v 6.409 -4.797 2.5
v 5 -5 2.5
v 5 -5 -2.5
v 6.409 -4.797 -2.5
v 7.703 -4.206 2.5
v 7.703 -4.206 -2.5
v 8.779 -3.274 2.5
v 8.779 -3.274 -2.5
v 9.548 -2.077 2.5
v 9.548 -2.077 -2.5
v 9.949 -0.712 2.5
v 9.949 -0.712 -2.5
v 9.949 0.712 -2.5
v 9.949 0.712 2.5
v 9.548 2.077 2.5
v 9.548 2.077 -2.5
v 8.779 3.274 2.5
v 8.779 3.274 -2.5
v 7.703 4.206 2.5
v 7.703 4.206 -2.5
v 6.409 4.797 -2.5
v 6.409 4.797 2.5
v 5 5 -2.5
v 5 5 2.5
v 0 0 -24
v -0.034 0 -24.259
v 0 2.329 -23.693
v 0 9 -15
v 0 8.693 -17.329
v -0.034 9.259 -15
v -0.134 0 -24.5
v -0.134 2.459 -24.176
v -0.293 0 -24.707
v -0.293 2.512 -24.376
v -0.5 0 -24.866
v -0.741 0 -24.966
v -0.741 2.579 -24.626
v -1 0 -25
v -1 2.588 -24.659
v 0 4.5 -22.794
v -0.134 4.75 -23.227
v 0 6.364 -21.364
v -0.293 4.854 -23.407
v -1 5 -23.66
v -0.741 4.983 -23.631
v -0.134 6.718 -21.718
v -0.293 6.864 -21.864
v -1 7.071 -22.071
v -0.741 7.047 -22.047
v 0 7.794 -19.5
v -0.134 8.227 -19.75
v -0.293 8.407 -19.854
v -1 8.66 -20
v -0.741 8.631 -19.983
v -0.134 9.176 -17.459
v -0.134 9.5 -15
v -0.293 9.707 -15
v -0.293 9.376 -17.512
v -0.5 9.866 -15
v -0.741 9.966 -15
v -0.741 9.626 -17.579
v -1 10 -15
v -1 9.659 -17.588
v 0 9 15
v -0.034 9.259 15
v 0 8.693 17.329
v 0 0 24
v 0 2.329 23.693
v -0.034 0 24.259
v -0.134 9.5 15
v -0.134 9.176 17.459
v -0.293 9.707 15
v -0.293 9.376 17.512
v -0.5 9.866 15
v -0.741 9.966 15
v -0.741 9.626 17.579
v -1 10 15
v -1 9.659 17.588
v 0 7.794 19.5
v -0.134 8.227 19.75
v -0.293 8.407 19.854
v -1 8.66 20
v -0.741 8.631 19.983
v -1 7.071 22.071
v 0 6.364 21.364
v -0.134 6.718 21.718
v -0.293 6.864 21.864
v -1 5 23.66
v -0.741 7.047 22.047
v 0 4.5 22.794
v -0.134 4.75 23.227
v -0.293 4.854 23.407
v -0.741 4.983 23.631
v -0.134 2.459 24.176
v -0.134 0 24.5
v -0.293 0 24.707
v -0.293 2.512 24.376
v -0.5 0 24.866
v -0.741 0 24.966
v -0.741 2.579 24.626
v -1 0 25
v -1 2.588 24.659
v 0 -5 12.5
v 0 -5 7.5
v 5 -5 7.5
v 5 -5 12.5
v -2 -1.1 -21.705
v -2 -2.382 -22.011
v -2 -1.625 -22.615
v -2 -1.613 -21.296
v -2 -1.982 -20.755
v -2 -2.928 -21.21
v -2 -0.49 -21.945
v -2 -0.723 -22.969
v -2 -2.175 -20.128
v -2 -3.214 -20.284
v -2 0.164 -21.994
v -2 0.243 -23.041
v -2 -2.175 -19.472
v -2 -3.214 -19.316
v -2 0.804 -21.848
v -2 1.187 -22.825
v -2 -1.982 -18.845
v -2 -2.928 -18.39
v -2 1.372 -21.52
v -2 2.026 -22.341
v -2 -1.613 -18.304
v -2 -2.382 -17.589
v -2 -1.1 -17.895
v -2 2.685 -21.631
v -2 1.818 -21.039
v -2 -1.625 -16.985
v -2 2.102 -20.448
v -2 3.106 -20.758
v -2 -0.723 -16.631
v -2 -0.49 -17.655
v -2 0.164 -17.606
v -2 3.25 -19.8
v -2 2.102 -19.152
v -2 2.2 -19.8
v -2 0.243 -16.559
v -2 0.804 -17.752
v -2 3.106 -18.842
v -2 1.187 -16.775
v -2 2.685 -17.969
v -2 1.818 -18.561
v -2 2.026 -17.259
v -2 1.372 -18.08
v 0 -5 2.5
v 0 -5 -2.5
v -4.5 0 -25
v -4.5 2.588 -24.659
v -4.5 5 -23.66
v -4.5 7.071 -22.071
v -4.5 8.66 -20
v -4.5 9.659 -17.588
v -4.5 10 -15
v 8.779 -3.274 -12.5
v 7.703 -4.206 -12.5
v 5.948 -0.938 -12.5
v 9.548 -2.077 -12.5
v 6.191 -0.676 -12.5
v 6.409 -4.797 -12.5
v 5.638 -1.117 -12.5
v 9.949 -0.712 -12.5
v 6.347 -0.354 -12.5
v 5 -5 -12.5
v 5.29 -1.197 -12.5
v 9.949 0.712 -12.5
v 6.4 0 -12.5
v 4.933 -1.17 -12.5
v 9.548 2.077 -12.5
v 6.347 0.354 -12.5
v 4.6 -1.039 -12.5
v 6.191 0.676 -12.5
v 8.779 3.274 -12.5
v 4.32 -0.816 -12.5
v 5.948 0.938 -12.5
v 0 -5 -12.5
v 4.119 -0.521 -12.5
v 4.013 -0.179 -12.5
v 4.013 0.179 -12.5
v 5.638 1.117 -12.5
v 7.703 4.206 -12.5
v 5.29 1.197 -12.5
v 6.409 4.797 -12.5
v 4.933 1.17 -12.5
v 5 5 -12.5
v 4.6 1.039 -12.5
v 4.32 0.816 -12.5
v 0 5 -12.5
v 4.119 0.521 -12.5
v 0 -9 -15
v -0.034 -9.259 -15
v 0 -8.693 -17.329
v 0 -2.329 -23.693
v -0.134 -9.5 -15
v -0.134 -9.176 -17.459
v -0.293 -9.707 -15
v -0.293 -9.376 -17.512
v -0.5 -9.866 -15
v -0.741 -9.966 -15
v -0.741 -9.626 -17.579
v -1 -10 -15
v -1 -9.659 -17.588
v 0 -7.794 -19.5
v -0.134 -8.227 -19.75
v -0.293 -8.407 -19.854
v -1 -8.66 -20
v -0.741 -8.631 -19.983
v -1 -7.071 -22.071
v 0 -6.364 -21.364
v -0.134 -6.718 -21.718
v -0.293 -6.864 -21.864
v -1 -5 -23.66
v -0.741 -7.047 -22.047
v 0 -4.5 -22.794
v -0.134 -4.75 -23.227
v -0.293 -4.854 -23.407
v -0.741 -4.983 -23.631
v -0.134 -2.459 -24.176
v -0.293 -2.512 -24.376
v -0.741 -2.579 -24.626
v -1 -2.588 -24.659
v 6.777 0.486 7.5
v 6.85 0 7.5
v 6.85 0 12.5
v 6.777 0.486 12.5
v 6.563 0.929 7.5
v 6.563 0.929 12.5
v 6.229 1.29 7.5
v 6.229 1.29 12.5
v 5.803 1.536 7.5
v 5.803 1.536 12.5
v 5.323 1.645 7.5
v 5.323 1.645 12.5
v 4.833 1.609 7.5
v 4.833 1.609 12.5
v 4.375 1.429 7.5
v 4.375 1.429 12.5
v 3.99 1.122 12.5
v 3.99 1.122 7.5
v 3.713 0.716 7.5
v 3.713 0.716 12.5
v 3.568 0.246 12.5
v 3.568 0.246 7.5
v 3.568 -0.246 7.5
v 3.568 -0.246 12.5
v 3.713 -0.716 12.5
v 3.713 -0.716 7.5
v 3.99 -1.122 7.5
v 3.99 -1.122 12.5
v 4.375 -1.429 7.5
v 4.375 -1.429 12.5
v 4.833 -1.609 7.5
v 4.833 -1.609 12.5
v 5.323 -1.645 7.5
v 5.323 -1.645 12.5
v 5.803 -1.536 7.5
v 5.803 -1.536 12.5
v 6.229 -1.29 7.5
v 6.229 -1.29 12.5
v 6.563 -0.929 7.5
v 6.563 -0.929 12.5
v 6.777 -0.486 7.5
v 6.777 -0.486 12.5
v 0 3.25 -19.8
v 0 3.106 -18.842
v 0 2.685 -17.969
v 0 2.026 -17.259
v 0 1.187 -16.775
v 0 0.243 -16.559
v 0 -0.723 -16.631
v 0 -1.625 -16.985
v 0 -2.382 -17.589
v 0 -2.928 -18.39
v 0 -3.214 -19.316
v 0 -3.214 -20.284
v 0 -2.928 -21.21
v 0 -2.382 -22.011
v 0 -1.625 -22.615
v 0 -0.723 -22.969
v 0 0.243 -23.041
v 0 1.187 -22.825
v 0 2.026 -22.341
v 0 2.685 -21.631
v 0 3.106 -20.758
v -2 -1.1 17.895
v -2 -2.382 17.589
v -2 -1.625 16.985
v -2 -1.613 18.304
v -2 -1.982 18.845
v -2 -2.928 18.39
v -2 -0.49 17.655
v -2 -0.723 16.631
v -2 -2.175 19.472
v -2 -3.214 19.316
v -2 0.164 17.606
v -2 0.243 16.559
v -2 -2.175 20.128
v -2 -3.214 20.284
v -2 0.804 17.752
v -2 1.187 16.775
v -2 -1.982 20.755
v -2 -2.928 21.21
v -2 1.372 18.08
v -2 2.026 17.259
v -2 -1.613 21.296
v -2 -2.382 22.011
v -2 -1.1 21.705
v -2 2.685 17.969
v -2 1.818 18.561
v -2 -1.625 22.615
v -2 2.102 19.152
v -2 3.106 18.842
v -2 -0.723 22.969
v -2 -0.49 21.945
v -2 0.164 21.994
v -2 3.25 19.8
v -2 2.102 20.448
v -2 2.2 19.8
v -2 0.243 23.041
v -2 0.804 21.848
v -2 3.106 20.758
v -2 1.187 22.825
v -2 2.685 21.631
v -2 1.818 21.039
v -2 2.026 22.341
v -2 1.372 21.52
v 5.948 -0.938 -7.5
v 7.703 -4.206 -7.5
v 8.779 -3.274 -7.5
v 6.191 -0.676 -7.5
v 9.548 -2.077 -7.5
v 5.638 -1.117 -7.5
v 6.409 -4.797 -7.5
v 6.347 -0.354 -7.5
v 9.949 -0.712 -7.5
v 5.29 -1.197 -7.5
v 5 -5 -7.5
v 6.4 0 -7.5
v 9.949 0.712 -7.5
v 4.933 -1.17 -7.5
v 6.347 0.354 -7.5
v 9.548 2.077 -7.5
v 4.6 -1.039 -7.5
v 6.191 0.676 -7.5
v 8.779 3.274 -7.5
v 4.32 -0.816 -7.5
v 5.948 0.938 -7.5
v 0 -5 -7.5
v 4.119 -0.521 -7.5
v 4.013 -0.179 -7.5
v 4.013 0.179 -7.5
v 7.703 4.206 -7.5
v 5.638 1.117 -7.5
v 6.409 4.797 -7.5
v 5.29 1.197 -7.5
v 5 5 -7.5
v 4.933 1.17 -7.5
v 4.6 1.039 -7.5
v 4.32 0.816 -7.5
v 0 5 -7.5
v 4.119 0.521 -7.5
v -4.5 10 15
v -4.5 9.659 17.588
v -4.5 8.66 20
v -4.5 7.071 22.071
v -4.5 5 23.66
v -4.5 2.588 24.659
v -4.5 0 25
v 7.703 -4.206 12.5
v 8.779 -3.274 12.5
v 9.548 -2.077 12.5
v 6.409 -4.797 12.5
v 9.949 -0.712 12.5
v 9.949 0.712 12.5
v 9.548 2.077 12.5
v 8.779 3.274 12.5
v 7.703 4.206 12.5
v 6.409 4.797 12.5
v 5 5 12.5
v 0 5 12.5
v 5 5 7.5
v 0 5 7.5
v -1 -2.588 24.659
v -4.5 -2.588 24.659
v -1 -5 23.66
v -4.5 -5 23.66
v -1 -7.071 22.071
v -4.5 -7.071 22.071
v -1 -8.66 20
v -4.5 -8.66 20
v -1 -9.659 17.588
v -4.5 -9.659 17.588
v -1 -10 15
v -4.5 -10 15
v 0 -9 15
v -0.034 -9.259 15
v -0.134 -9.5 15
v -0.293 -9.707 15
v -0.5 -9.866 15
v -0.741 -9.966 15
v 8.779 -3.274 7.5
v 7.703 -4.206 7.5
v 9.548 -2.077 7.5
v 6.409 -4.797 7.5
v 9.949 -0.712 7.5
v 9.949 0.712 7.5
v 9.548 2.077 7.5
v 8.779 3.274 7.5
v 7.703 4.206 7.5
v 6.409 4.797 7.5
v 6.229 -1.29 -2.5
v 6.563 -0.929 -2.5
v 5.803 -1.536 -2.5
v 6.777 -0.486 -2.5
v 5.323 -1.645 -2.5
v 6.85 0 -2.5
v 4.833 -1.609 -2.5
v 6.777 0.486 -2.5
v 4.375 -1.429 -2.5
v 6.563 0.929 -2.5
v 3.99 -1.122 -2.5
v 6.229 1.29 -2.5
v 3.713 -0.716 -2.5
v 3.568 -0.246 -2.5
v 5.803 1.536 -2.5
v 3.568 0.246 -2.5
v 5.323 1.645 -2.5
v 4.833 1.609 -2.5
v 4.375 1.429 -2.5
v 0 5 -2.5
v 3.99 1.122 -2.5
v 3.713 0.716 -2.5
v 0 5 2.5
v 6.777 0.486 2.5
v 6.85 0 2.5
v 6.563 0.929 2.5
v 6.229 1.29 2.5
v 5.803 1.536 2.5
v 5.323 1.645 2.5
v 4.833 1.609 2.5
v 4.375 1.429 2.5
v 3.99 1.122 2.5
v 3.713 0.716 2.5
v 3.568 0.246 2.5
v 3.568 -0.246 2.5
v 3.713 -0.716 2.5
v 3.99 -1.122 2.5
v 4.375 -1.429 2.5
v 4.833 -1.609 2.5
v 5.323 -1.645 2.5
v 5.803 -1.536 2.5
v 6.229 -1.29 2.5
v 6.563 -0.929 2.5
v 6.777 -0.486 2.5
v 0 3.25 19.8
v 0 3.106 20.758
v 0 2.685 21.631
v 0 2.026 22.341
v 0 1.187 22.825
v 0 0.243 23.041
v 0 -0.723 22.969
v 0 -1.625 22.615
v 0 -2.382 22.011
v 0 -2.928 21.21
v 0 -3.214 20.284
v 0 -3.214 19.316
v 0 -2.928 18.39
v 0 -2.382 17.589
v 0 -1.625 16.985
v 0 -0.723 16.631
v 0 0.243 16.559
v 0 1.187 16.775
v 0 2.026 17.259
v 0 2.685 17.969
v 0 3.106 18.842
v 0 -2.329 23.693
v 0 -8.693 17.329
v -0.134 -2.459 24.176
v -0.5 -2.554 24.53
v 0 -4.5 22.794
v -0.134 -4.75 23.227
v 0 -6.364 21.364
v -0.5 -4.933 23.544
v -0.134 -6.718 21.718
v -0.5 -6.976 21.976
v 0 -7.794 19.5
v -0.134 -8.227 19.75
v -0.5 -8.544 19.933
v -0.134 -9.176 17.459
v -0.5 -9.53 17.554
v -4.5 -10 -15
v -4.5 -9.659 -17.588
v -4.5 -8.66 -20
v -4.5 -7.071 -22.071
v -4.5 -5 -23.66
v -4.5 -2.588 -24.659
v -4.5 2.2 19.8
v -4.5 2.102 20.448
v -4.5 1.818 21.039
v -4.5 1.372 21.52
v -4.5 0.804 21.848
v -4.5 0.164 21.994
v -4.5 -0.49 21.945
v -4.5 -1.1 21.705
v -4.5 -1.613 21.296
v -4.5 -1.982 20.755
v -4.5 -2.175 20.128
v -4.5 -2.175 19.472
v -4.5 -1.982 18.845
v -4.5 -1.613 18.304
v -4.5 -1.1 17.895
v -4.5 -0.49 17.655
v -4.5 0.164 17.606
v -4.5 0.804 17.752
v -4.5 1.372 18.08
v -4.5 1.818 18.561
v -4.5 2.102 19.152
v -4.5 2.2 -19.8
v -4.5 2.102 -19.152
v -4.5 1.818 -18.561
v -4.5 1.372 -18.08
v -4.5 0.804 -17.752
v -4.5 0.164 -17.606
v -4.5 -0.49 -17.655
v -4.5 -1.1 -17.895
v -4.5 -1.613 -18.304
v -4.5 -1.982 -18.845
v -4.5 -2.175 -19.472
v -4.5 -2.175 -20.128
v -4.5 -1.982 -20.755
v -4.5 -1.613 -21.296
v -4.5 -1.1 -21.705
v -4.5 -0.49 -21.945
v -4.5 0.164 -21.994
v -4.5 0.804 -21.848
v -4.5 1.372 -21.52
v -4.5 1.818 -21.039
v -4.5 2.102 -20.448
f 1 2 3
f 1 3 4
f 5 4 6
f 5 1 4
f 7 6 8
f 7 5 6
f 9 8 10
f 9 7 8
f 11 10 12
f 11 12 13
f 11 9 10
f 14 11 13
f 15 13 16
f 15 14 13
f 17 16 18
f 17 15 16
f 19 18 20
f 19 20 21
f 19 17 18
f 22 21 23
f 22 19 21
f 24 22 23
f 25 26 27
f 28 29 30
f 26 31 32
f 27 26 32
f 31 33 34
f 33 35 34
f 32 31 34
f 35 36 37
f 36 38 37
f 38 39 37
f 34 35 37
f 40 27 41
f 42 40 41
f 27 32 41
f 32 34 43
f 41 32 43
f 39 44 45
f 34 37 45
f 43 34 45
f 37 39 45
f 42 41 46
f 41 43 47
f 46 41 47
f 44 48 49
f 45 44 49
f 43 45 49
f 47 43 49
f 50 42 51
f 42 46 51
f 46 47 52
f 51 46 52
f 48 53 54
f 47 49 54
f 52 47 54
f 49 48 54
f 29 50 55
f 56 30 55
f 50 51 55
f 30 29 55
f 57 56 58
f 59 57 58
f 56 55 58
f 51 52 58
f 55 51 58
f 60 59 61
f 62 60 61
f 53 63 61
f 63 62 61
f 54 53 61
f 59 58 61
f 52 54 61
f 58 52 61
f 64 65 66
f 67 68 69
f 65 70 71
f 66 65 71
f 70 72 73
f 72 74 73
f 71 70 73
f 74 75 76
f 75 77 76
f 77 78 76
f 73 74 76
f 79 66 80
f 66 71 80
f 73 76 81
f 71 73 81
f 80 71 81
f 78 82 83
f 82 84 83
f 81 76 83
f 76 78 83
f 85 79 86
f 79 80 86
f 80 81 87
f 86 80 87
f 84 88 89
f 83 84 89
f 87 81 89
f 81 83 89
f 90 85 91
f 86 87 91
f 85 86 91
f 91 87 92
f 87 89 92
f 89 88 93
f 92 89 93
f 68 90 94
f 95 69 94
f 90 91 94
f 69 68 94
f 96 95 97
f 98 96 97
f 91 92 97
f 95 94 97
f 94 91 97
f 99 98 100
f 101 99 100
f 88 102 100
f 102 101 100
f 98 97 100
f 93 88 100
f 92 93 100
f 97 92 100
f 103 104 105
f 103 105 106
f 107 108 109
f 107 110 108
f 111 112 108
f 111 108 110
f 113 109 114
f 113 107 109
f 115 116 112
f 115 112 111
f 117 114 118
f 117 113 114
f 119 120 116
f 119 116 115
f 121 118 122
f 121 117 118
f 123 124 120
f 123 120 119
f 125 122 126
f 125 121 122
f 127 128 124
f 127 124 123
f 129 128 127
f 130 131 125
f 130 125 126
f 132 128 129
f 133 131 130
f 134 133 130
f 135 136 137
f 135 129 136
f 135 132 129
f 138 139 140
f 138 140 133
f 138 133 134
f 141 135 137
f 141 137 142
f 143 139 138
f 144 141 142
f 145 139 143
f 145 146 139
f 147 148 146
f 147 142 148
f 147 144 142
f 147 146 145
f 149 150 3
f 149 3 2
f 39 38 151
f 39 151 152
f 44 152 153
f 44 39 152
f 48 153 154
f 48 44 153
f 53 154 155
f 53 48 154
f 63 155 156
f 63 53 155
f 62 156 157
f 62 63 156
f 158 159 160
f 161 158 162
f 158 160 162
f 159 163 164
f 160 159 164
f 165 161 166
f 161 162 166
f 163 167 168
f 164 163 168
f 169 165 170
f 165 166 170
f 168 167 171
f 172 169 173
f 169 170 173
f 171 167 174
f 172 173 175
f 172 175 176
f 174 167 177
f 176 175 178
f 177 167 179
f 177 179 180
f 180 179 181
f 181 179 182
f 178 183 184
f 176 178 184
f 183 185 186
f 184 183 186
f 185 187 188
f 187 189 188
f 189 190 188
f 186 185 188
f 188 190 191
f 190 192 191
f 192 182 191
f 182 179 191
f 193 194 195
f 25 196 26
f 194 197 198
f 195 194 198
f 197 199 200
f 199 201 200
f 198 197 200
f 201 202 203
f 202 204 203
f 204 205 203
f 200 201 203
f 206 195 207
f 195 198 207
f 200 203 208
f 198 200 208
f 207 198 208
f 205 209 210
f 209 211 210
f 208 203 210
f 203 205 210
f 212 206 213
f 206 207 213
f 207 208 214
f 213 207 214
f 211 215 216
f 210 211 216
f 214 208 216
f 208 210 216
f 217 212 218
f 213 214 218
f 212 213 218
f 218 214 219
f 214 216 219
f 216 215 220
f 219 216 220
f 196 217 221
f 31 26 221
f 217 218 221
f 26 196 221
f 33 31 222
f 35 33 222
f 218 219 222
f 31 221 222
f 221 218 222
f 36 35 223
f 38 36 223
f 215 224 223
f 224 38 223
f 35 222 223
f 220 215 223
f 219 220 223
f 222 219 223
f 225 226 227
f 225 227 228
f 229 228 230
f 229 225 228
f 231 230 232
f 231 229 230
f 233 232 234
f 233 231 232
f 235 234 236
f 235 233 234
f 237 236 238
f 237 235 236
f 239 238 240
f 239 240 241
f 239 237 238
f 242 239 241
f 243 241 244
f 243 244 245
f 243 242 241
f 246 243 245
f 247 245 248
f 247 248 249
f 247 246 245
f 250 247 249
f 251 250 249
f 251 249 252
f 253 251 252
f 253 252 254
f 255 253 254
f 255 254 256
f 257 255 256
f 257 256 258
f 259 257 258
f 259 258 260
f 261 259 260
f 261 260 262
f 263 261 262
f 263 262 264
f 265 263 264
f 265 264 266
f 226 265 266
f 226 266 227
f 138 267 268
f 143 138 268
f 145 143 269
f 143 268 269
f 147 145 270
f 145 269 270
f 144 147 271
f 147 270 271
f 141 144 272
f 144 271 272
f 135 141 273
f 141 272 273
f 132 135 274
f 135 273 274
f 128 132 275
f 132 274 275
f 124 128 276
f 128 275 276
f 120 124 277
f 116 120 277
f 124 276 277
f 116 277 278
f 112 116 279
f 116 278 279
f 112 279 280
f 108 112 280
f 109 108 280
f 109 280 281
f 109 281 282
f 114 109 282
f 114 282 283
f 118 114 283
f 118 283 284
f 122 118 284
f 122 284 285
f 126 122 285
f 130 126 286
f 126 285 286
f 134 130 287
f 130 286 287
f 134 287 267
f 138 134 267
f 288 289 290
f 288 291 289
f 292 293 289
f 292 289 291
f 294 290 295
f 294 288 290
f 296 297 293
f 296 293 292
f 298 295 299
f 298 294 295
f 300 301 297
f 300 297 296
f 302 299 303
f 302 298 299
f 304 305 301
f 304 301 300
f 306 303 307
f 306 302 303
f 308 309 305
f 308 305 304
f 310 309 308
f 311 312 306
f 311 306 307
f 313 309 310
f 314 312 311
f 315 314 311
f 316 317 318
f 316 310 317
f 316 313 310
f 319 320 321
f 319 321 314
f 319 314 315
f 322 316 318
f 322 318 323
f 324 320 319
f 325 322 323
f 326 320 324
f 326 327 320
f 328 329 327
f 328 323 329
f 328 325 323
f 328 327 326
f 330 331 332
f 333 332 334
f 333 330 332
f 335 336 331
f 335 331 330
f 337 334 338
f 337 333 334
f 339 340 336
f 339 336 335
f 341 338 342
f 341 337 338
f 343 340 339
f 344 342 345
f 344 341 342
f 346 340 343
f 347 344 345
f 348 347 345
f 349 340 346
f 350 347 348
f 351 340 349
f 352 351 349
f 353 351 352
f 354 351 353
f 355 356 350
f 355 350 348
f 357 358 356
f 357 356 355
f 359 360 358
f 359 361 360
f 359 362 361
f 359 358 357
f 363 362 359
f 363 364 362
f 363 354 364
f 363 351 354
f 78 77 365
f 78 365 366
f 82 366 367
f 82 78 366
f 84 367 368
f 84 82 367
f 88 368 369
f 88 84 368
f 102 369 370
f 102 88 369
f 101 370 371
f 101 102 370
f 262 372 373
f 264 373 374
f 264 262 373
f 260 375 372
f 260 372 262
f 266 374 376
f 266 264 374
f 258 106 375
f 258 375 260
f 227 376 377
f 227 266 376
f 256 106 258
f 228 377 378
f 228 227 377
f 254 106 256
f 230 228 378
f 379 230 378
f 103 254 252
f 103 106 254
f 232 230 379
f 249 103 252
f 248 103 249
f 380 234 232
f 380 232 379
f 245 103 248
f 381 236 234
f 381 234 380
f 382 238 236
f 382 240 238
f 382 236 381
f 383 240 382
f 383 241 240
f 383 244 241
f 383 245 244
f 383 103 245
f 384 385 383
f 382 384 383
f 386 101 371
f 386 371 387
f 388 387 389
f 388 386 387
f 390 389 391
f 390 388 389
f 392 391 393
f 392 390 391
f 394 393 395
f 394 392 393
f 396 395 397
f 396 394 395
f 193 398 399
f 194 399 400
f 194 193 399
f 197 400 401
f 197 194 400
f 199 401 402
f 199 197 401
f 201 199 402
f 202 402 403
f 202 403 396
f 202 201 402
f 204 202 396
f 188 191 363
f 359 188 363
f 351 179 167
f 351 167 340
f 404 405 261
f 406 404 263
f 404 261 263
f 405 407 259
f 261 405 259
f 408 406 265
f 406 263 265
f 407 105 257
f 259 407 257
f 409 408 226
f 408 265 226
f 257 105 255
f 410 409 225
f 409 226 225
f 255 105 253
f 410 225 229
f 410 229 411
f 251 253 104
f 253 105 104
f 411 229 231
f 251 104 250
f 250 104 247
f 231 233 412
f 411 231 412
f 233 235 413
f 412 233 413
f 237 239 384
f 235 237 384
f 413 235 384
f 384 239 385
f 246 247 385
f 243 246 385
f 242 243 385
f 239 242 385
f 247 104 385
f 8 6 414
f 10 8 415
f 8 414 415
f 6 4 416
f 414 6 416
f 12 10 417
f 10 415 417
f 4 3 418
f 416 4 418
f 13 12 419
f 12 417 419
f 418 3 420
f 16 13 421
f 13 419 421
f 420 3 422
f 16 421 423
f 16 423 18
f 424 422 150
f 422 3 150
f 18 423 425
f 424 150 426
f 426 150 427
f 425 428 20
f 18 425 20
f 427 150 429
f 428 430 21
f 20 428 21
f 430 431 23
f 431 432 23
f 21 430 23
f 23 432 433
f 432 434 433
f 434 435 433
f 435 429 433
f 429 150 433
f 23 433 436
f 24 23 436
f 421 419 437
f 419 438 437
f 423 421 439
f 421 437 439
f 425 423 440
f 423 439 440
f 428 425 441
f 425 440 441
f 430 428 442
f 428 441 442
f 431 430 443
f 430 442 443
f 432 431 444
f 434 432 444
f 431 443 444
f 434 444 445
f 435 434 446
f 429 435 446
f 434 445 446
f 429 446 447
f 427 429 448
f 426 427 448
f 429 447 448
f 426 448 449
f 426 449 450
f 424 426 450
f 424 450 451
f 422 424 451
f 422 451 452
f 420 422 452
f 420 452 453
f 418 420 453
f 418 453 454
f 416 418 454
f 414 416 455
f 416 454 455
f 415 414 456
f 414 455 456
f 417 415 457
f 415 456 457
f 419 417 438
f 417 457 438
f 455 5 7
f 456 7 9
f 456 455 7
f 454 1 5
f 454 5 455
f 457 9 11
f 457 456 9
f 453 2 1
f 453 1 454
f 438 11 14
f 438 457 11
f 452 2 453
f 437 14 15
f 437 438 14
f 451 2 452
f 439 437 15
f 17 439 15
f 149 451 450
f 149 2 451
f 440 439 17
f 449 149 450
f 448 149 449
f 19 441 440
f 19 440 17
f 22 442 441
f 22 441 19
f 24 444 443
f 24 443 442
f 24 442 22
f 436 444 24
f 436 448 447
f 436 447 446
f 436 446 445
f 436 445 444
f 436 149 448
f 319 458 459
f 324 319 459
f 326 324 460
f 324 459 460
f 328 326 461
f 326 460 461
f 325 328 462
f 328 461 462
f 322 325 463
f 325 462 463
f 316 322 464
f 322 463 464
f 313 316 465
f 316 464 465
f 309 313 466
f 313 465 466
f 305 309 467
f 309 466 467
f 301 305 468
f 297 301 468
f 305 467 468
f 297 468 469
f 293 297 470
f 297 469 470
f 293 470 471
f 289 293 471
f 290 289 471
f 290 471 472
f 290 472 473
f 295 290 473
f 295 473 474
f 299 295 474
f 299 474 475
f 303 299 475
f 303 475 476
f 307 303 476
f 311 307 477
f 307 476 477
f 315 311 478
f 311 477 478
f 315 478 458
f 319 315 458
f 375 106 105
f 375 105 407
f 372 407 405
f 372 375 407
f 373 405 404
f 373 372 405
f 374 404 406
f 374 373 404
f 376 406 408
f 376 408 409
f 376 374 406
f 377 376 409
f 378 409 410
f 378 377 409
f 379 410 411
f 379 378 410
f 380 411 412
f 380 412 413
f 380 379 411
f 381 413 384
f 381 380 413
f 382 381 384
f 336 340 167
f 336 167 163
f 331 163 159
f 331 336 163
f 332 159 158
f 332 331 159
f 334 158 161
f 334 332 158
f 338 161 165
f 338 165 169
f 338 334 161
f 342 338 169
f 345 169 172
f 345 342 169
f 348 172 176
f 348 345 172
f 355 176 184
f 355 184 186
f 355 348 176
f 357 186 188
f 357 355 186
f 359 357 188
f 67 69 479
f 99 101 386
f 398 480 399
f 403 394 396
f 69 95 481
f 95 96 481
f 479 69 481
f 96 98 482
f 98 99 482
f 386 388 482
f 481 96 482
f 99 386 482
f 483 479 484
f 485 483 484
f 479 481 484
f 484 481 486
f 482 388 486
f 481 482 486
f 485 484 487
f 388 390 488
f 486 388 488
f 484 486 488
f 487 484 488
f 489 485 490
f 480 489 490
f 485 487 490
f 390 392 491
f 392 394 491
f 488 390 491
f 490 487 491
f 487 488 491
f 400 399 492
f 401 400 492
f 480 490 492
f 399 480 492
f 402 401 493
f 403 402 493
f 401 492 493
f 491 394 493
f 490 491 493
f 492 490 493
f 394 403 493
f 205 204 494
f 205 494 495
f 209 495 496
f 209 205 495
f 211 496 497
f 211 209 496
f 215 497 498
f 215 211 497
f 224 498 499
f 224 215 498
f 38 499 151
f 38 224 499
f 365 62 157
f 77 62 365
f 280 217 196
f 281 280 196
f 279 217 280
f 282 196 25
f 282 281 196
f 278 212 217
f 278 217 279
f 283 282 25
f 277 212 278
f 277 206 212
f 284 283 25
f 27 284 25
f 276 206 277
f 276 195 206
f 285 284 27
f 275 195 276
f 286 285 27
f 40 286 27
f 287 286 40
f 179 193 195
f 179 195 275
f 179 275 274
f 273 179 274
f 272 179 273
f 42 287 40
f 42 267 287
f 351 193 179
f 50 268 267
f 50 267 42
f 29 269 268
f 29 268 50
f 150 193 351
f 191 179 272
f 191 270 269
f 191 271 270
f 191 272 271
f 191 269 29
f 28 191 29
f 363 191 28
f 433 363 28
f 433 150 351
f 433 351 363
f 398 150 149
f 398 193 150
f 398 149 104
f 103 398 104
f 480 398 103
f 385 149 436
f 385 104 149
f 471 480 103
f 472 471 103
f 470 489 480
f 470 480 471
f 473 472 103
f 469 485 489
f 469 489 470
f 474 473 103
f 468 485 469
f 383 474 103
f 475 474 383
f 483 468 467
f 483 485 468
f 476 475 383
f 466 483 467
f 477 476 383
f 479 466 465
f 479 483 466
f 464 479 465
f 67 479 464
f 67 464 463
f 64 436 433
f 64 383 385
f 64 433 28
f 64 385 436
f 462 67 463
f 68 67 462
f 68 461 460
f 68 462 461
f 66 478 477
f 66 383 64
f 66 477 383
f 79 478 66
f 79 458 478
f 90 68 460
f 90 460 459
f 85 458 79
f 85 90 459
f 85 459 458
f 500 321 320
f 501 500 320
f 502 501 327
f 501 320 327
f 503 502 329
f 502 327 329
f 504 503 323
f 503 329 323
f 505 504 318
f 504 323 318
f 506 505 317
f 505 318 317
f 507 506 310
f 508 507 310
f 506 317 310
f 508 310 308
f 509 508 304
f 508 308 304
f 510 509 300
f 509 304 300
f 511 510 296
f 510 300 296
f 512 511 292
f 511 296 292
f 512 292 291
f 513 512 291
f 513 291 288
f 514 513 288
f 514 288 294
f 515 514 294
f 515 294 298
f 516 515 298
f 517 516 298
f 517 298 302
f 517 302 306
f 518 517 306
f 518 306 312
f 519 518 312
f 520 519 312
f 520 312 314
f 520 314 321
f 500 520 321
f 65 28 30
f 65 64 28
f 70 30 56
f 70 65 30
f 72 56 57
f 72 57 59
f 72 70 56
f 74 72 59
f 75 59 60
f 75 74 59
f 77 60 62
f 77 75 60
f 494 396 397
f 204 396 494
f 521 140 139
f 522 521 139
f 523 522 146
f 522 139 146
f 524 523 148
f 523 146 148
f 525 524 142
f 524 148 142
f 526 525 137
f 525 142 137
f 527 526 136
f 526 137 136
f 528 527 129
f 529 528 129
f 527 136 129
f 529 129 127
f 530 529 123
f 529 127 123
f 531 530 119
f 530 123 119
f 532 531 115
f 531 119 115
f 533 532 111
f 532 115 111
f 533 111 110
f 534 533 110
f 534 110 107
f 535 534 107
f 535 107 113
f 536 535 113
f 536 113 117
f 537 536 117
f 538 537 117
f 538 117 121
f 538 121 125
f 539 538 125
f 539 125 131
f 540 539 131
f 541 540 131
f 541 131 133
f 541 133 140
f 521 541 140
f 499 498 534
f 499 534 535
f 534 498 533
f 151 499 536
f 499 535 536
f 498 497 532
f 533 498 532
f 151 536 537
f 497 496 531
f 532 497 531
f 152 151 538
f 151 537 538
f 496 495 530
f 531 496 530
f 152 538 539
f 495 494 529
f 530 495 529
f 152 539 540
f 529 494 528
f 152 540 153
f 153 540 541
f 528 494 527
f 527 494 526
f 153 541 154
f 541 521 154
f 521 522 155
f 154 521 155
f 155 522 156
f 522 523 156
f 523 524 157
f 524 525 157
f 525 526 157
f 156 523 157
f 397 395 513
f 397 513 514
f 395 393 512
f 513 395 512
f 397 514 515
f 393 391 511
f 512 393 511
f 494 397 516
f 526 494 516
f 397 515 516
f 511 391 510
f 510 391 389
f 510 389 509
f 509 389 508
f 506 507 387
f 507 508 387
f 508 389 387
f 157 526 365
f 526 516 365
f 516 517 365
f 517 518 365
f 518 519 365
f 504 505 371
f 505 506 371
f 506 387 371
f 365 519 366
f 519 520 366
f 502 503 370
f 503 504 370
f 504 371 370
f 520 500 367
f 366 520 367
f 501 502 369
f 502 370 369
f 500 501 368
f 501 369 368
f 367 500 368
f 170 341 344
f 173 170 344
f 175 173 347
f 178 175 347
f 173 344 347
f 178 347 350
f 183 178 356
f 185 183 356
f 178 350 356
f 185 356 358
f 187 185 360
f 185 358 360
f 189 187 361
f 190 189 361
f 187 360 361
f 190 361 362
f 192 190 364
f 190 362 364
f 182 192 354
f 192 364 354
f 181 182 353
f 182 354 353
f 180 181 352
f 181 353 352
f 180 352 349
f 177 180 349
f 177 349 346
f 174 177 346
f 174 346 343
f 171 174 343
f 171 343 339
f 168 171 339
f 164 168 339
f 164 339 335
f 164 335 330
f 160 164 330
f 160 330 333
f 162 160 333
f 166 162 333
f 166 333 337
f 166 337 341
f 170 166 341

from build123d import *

# Parameters (mm, degrees)
F0_R          = 3.25
F0_W          = 10
F0_H          = 5
F0_R_2        = 2.2
F2_DEPTH      = 4.5
F3_DEPTH      = 10
F1_R          = 1.65
F1_R_2        = 1.2
F4_DEPTH      = 25
F5_DEPTH      = 2.5
F5_DEPTH_BACK = 12.5
F6_START      = -6.1
F6_DEPTH      = 8.5
F7_DEPTH      = 2
F8_R          = 1


with BuildPart() as f2:
    # F0 (on Right) → F2 (new body)
    with BuildSketch(Plane.YZ):
        with BuildLine():
            ThreePointArc((0, 25), (-7.0710678119, 22.0710678119), (-10, 15))
            Line((-10, 15), (-10, -15))
            ThreePointArc((-10, -15), (-7.0710678119, -22.0710678119), (0, -25))
            ThreePointArc((0, -25), (7.0710678119, -22.0710678119), (10, -15))
            Line((10, -15), (10, 15))
            ThreePointArc((10, 15), (7.0710678119, 22.0710678119), (0, 25))
        make_face()
        with Locations((0, -19.8)):
            Circle(F0_R, mode=Mode.SUBTRACT)
        with Locations((0, -10)):
            Rectangle(F0_W, F0_H, mode=Mode.SUBTRACT)
        Rectangle(F0_W, F0_H, mode=Mode.SUBTRACT)
        with Locations((0, 10)):
            Rectangle(F0_W, F0_H, mode=Mode.SUBTRACT)
        with Locations((0, 19.8)):
            Circle(F0_R, mode=Mode.SUBTRACT)
        with Locations((0, 10)):
            Rectangle(F0_W, F0_H)
        Rectangle(F0_W, F0_H)
        with Locations((0, -10)):
            Rectangle(F0_W, F0_H)
        with Locations((0, 19.8)):
            Circle(F0_R)
        with Locations((0, 19.8)):
            Circle(F0_R_2, mode=Mode.SUBTRACT)
        with Locations((0, -19.8)):
            Circle(F0_R)
        with Locations((0, -19.8)):
            Circle(F0_R_2, mode=Mode.SUBTRACT)
    extrude(amount=-F2_DEPTH)

    # F0 (on Right) → F3 (join)
    with BuildSketch(Plane.YZ):
        with Locations((0, 10)):
            Rectangle(F0_W, F0_H)
        Rectangle(F0_W, F0_H)
        with Locations((0, -10)):
            Rectangle(F0_W, F0_H)
    extrude(amount=F3_DEPTH)

    # F1 (on Top) → F4 (intersect, symmetric)
    with BuildSketch(Plane.XY):
        Polygon((0, -5), (0, 5), (0, 10), (-4.5, 10), (-4.5, -10), (0, -10), align=None)
        with BuildLine():
            Line((5, 5), (0, 5))
            Line((0, 5), (0, -5))
            Line((0, -5), (5, -5))
            ThreePointArc((5, -5), (8.5355339059, -3.5355339059), (10, 0))
            ThreePointArc((10, 0), (8.5355339059, 3.5355339059), (5, 5))
        make_face()
        with Locations((5.2, 0)):
            Circle(F1_R, mode=Mode.SUBTRACT)
        with Locations((5.2, 0)):
            Circle(F1_R)
        with Locations((5.2, 0)):
            Circle(F1_R_2, mode=Mode.SUBTRACT)
        with Locations((5.2, 0)):
            Circle(F1_R_2)
    extrude(amount=F4_DEPTH, both=True, mode=Mode.INTERSECT)

    # F1 (on Top) → F5 (cut, two sides)
    with BuildSketch(Plane.XY) as f5_sk:
        with Locations((5.2, 0)):
            Circle(F1_R)
        with Locations((5.2, 0)):
            Circle(F1_R_2, mode=Mode.SUBTRACT)
        with Locations((5.2, 0)):
            Circle(F1_R_2)
    extrude(amount=-F5_DEPTH, mode=Mode.SUBTRACT)
    extrude(f5_sk.sketch, amount=F5_DEPTH_BACK, mode=Mode.SUBTRACT)

    # F1 (on Top) → F6 (cut)
    with BuildSketch(Plane.XY.offset(F6_START)):
        with Locations((5.2, 0)):
            Circle(F1_R_2)
    extrude(amount=-F6_DEPTH, mode=Mode.SUBTRACT)

    # F0 (on Right) → F7 (cut)
    with BuildSketch(Plane.YZ):
        with Locations((0, 19.8)):
            Circle(F0_R)
        with Locations((0, 19.8)):
            Circle(F0_R_2, mode=Mode.SUBTRACT)
        with Locations((0, -19.8)):
            Circle(F0_R)
        with Locations((0, -19.8)):
            Circle(F0_R_2, mode=Mode.SUBTRACT)
    extrude(amount=-F7_DEPTH, mode=Mode.SUBTRACT)

    # F8
    f8_edges = [f2.edges().sort_by_distance(p)[0] for p in [
        (0, 10, 0),
        (0, 0, -25),
        (0, 0, 25),
        (0, -10, 0),
    ]]
    fillet(f8_edges, radius=F8_R)


solid = f2.part
